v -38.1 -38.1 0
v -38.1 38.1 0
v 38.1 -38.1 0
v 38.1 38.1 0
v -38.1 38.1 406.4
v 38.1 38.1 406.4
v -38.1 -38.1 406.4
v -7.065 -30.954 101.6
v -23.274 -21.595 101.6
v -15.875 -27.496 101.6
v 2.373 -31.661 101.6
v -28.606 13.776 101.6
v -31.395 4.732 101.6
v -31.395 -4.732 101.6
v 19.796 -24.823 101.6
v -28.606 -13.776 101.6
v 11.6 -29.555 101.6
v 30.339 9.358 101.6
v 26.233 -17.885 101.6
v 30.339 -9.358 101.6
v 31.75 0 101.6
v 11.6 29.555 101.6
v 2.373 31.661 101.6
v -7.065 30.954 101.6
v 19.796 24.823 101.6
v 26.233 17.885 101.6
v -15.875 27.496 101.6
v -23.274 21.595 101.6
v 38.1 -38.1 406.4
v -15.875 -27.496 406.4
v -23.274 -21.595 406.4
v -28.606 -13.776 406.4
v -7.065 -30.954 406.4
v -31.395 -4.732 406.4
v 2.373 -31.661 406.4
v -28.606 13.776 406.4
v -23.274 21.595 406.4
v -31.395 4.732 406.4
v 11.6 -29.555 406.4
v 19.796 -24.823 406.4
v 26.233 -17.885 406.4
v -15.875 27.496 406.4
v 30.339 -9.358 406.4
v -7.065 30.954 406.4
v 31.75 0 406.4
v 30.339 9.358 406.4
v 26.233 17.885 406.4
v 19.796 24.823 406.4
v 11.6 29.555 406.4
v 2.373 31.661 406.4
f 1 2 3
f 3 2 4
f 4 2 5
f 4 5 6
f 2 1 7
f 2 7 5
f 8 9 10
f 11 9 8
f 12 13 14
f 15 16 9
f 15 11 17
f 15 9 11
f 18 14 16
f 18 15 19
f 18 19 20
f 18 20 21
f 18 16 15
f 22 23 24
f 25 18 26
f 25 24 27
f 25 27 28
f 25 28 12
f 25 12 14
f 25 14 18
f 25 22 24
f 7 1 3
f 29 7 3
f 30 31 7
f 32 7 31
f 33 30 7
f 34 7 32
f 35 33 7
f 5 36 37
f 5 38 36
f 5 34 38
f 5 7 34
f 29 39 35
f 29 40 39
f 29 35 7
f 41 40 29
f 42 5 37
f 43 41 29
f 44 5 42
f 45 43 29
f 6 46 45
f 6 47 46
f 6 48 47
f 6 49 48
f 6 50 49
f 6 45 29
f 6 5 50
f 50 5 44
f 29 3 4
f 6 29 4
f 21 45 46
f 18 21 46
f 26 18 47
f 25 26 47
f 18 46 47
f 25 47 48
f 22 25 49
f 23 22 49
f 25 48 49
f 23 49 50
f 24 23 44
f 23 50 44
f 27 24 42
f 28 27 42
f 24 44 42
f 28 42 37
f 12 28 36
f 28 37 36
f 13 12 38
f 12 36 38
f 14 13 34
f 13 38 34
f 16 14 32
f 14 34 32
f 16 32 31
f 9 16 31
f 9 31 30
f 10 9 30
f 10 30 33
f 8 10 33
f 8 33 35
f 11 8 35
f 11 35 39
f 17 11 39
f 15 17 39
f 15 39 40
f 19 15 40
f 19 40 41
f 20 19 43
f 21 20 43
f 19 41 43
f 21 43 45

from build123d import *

# Parameters (mm, degrees)
SKETCH1_W           = 76.2
SKETCH1_H           = 76.2
SKETCH1_R           = 31.75
BOSS_EXTRUDE1_DEPTH = 406.4
CUT_EXTRUDE1_START  = 406.4
SKETCH1_3_R         = 31.75
CUT_EXTRUDE1_DEPTH  = 304.8


with BuildPart() as part:
    # Sketch1 → Boss-Extrude1 (new body)
    with BuildSketch(Plane.XY):
        Rectangle(SKETCH1_W, SKETCH1_H)
        Circle(SKETCH1_R, mode=Mode.SUBTRACT)
        Circle(SKETCH1_R)
    extrude(amount=BOSS_EXTRUDE1_DEPTH)

    # Sketch1<3> → Cut-Extrude1 (cut)
    with BuildSketch(Plane.XY.offset(CUT_EXTRUDE1_START)):
        Circle(SKETCH1_3_R)
    extrude(amount=-CUT_EXTRUDE1_DEPTH, mode=Mode.SUBTRACT)


solid = part.part
